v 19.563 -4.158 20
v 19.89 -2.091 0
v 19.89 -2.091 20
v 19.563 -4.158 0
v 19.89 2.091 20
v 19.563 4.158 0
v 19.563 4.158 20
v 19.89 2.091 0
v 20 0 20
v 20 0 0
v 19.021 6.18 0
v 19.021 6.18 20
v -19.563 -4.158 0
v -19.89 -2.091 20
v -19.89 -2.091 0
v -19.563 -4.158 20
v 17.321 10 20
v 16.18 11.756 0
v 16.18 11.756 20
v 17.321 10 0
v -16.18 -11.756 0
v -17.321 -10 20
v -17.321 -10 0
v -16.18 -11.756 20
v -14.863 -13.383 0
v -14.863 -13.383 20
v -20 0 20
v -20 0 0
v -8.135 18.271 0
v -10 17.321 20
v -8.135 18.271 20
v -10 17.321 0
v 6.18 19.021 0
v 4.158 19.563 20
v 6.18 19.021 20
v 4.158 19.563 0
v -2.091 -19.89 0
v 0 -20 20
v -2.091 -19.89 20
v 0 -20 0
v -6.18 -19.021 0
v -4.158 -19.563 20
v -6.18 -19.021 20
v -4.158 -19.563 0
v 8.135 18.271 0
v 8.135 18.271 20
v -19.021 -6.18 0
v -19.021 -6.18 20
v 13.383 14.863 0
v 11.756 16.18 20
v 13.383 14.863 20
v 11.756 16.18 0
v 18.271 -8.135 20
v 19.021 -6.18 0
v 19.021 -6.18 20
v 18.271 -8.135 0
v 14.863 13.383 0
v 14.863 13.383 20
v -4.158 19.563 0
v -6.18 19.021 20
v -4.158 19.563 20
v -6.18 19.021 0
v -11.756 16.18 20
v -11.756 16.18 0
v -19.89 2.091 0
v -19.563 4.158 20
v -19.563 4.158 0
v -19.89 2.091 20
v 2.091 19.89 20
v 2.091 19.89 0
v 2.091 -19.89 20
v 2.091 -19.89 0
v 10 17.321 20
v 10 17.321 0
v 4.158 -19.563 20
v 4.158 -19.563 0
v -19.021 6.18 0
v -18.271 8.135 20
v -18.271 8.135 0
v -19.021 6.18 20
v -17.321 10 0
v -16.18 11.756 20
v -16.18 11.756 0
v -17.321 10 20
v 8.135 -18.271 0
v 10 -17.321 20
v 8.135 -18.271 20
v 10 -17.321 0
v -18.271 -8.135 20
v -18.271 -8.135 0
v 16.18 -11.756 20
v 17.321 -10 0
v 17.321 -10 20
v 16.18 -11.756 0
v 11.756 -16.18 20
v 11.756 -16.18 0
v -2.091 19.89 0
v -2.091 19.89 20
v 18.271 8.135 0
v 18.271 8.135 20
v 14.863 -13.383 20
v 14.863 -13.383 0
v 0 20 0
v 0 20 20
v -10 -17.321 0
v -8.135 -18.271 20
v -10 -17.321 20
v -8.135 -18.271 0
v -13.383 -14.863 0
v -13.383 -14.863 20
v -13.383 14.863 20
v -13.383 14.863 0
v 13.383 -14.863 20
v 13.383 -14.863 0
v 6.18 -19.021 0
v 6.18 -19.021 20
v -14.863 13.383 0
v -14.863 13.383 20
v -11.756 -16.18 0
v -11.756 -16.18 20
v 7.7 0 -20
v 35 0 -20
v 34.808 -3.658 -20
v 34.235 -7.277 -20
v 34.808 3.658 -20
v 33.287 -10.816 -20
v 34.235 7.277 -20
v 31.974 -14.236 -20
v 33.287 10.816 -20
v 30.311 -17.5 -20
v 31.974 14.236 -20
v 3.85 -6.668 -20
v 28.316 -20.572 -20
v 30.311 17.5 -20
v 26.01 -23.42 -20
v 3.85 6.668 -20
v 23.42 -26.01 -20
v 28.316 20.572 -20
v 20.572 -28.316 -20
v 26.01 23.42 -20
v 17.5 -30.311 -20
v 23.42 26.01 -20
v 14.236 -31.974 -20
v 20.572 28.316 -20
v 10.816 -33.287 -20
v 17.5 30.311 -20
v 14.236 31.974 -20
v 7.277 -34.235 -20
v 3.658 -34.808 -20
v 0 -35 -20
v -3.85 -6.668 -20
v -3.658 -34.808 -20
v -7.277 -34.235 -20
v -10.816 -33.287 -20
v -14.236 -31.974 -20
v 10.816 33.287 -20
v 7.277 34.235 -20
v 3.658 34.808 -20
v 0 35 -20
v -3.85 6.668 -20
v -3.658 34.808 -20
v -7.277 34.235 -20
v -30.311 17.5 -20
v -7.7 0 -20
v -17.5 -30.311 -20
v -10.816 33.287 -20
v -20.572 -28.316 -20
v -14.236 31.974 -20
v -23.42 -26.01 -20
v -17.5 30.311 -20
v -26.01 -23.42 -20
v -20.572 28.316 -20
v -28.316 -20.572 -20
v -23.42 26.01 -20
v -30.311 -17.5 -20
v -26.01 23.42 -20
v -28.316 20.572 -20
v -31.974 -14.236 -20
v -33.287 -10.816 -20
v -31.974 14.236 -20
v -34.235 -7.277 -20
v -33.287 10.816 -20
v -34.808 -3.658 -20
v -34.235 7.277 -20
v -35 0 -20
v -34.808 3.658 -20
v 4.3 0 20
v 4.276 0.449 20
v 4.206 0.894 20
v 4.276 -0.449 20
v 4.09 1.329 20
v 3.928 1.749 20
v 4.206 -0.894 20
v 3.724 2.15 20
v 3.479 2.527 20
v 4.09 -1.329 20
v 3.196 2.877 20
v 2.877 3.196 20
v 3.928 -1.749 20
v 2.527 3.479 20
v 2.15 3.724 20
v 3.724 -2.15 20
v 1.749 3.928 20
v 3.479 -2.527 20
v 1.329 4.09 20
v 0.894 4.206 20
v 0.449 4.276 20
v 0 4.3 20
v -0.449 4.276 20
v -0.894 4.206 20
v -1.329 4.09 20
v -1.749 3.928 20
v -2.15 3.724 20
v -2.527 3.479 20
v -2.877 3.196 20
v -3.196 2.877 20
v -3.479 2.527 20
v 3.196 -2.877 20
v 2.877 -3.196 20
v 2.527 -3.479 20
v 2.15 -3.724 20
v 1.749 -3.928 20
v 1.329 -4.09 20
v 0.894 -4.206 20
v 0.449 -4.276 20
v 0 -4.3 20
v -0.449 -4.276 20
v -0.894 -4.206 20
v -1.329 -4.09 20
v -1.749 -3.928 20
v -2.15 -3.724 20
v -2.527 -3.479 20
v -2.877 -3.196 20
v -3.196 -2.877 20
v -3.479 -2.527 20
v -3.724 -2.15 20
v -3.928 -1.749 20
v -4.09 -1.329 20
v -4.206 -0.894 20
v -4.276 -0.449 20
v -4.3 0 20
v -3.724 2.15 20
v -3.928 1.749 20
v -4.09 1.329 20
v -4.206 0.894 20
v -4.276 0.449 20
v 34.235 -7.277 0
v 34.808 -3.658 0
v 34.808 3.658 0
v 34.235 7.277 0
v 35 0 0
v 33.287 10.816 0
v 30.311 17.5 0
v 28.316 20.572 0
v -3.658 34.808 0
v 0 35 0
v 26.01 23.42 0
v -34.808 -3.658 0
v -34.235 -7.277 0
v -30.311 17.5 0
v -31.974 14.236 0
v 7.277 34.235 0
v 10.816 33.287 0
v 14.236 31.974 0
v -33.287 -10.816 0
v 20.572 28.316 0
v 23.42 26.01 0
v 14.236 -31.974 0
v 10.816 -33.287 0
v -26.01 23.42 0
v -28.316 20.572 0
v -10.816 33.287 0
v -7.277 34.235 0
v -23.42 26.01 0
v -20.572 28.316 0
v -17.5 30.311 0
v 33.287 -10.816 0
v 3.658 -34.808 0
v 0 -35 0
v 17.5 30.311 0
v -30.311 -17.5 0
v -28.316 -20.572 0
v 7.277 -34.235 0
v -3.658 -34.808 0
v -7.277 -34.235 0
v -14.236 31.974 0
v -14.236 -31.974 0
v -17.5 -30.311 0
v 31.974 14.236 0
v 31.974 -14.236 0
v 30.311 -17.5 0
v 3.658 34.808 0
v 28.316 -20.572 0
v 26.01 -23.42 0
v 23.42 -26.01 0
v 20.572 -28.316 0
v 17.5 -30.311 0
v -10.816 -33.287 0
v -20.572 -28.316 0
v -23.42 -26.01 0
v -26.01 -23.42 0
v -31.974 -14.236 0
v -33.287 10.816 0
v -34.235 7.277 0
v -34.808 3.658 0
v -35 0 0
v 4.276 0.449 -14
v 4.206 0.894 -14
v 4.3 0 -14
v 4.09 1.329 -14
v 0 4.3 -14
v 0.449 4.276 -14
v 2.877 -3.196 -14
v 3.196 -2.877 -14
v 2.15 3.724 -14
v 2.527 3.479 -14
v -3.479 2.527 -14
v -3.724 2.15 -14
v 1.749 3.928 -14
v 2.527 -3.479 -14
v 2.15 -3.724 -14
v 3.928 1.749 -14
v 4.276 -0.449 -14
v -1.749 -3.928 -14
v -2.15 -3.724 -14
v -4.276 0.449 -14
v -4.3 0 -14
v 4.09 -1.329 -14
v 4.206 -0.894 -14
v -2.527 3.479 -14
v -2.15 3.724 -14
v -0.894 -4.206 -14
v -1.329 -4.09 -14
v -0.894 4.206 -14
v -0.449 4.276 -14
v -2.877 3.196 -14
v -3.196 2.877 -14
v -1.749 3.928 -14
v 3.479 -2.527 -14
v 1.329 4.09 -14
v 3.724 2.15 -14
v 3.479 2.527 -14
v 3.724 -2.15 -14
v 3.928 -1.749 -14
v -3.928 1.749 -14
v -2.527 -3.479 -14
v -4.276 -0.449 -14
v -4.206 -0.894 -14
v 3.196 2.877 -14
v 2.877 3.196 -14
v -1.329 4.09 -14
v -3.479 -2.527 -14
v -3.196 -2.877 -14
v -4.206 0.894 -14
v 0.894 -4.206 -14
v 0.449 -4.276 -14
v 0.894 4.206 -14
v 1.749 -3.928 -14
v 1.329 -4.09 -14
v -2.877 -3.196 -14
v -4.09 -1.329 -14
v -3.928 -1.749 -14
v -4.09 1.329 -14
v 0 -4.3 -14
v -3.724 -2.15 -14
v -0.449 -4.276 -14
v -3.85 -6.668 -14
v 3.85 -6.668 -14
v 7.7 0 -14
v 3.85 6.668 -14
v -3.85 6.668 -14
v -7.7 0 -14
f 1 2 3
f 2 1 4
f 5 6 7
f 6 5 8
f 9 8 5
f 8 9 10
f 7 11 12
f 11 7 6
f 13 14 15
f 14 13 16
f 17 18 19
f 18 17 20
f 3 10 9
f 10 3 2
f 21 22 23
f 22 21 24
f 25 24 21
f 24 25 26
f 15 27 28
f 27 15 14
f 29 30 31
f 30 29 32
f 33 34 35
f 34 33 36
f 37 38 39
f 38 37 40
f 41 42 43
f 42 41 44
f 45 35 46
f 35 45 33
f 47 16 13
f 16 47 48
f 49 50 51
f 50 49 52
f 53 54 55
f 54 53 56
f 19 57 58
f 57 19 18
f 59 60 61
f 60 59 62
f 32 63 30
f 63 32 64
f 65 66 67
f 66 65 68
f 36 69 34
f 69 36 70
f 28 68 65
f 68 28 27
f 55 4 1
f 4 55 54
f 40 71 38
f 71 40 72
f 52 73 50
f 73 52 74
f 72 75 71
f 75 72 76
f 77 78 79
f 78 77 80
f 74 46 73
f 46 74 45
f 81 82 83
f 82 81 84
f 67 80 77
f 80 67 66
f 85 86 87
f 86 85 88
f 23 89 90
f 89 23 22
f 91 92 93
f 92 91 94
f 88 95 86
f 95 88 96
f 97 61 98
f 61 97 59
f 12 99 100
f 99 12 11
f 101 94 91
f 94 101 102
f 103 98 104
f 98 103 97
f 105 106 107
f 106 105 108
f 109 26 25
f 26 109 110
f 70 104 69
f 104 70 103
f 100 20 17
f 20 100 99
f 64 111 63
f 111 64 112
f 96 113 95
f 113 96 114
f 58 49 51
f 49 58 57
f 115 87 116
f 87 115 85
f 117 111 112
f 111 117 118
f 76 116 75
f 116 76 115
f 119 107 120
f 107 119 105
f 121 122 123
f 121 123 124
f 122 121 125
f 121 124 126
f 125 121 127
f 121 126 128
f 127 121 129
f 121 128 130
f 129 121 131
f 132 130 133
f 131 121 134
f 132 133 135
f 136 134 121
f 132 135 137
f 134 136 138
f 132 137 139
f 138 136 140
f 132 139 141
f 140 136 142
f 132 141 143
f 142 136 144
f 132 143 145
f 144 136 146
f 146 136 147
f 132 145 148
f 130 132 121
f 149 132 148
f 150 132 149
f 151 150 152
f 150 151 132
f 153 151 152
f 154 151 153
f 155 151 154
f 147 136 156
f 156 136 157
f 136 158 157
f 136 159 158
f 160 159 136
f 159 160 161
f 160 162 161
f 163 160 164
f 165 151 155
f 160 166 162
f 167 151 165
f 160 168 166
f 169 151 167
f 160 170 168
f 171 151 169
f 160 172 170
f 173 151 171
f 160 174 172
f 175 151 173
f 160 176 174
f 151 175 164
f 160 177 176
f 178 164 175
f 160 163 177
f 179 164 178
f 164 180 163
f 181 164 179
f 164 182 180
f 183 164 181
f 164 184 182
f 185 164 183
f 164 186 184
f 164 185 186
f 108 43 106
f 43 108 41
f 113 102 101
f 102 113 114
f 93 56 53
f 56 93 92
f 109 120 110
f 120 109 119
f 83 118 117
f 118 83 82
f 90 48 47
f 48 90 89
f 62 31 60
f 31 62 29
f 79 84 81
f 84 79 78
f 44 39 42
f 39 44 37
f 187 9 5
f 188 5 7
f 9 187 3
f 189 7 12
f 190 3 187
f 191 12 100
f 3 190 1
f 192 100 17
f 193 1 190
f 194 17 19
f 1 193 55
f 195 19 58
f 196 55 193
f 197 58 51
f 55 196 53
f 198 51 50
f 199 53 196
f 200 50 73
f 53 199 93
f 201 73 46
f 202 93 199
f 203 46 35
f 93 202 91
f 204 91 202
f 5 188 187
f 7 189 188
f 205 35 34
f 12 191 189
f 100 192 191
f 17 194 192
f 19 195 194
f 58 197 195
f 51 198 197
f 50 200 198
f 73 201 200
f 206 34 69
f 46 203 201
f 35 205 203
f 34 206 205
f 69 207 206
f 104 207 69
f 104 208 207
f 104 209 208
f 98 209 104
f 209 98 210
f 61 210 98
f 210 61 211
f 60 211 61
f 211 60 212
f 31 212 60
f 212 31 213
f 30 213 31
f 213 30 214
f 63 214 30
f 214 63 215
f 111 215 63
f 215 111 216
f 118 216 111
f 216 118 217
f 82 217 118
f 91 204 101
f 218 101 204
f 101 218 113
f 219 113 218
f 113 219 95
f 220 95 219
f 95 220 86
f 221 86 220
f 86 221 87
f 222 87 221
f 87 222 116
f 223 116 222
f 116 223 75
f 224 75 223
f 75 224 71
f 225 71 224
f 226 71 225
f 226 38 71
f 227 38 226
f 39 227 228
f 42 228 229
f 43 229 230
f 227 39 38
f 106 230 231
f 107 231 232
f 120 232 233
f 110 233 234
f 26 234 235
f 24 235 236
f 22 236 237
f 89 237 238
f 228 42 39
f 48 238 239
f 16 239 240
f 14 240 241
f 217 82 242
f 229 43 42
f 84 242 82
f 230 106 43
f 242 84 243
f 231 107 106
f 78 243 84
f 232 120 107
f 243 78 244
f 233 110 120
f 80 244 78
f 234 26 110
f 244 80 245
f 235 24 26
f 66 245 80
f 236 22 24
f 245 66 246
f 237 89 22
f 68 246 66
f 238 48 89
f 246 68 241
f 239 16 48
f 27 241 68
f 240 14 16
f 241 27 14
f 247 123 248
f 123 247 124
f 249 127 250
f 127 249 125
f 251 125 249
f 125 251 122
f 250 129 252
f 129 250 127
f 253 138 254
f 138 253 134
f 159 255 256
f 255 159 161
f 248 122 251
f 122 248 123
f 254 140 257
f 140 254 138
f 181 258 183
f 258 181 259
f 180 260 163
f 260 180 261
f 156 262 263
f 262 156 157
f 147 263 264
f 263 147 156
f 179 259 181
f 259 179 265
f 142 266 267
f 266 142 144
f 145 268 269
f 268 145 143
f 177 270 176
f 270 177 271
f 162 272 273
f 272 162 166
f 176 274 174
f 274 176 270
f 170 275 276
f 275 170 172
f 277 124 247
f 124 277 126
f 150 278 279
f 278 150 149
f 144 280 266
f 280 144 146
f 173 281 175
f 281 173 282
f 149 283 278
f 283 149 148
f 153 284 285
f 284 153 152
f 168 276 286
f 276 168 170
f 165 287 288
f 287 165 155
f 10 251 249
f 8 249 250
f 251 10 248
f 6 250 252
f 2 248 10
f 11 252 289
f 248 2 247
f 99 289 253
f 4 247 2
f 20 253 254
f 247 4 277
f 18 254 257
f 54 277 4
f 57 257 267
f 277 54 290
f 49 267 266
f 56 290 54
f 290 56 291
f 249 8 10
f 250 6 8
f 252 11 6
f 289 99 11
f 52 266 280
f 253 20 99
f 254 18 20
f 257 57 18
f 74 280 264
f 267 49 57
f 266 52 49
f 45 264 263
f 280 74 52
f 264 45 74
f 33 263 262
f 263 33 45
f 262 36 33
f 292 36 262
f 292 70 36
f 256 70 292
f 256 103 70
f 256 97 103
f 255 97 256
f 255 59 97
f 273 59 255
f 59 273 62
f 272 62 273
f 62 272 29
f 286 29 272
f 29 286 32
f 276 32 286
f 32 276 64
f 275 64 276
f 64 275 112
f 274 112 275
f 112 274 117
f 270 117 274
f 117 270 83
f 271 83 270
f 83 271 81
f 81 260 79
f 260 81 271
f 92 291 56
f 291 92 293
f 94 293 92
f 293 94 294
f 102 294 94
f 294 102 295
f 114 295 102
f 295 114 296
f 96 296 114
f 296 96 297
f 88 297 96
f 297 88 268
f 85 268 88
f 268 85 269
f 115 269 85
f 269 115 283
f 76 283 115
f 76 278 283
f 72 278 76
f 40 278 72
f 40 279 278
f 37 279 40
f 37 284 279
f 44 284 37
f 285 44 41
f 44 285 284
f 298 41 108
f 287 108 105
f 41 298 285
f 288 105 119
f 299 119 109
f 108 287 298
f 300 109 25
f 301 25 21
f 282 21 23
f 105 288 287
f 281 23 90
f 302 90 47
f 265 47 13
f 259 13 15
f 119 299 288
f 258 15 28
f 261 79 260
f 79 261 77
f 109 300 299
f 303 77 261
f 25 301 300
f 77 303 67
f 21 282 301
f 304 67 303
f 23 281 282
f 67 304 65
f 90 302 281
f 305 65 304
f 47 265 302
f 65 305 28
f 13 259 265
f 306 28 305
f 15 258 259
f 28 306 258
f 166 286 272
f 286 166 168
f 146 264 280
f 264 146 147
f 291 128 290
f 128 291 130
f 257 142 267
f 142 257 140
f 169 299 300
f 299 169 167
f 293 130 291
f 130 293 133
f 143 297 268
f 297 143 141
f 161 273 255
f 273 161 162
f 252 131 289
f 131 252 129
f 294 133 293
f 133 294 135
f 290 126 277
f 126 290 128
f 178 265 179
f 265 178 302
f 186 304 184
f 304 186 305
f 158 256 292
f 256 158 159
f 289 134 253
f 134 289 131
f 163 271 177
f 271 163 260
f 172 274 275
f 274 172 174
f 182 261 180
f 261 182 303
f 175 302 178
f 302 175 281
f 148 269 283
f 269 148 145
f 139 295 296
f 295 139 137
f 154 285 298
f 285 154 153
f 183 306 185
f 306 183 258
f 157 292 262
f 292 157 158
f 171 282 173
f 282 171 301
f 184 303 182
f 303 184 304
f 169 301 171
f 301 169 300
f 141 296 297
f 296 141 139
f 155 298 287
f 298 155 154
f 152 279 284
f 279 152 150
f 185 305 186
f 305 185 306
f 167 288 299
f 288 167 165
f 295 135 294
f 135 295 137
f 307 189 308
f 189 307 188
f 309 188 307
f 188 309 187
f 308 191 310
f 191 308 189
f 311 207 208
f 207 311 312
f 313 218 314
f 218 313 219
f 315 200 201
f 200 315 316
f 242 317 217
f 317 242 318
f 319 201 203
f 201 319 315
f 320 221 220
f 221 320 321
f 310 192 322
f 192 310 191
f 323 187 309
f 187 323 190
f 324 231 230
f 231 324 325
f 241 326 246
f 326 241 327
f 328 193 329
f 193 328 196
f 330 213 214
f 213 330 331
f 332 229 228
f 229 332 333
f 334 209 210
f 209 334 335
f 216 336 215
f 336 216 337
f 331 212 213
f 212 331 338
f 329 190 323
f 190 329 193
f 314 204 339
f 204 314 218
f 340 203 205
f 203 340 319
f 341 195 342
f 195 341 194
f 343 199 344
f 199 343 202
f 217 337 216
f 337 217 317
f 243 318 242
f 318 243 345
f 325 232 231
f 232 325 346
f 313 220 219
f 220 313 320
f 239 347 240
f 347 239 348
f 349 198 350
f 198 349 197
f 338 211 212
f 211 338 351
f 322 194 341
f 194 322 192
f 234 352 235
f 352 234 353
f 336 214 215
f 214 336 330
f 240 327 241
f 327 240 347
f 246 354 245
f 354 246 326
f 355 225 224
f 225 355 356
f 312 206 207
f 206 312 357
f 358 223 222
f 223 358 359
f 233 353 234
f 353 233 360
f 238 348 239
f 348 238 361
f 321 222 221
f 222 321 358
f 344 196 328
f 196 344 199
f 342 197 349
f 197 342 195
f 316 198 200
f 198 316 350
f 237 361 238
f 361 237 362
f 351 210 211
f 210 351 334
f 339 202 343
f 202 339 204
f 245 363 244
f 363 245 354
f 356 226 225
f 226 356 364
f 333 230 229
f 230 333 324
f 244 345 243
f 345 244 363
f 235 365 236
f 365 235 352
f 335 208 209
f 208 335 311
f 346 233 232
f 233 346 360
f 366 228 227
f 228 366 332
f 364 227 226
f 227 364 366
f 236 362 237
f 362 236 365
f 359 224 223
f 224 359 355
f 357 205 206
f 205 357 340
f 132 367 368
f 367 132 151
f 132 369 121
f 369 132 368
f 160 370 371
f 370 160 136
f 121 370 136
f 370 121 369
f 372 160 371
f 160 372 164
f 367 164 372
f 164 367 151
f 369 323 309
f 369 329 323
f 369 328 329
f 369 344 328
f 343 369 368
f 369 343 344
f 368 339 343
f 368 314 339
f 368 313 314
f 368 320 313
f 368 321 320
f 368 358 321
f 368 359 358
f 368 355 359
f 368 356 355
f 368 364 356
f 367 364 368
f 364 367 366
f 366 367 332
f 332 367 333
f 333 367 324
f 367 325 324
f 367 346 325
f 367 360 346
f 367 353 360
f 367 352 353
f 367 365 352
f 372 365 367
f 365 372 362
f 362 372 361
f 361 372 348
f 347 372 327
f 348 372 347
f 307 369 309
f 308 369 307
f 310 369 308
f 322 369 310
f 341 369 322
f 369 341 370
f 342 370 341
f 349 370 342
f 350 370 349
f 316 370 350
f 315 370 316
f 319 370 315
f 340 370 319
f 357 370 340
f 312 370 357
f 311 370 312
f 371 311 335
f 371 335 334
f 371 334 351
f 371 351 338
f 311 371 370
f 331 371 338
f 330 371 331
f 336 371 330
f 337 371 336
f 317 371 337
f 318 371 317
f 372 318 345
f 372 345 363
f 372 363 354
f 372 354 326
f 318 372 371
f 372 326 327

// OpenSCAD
$fn = 60;
stage();
module stage(){
 difference(){ 
  union(){
	cylinder(40,20,20,true);
	translate([0,0,-10]) cylinder(20,35,35,true);
   }
	cylinder(43,4.3,4.3,true);
	translate([0,0,-17]) cylinder(6,15.4/2,15.4/2,true, $fn=6);
 }

}
